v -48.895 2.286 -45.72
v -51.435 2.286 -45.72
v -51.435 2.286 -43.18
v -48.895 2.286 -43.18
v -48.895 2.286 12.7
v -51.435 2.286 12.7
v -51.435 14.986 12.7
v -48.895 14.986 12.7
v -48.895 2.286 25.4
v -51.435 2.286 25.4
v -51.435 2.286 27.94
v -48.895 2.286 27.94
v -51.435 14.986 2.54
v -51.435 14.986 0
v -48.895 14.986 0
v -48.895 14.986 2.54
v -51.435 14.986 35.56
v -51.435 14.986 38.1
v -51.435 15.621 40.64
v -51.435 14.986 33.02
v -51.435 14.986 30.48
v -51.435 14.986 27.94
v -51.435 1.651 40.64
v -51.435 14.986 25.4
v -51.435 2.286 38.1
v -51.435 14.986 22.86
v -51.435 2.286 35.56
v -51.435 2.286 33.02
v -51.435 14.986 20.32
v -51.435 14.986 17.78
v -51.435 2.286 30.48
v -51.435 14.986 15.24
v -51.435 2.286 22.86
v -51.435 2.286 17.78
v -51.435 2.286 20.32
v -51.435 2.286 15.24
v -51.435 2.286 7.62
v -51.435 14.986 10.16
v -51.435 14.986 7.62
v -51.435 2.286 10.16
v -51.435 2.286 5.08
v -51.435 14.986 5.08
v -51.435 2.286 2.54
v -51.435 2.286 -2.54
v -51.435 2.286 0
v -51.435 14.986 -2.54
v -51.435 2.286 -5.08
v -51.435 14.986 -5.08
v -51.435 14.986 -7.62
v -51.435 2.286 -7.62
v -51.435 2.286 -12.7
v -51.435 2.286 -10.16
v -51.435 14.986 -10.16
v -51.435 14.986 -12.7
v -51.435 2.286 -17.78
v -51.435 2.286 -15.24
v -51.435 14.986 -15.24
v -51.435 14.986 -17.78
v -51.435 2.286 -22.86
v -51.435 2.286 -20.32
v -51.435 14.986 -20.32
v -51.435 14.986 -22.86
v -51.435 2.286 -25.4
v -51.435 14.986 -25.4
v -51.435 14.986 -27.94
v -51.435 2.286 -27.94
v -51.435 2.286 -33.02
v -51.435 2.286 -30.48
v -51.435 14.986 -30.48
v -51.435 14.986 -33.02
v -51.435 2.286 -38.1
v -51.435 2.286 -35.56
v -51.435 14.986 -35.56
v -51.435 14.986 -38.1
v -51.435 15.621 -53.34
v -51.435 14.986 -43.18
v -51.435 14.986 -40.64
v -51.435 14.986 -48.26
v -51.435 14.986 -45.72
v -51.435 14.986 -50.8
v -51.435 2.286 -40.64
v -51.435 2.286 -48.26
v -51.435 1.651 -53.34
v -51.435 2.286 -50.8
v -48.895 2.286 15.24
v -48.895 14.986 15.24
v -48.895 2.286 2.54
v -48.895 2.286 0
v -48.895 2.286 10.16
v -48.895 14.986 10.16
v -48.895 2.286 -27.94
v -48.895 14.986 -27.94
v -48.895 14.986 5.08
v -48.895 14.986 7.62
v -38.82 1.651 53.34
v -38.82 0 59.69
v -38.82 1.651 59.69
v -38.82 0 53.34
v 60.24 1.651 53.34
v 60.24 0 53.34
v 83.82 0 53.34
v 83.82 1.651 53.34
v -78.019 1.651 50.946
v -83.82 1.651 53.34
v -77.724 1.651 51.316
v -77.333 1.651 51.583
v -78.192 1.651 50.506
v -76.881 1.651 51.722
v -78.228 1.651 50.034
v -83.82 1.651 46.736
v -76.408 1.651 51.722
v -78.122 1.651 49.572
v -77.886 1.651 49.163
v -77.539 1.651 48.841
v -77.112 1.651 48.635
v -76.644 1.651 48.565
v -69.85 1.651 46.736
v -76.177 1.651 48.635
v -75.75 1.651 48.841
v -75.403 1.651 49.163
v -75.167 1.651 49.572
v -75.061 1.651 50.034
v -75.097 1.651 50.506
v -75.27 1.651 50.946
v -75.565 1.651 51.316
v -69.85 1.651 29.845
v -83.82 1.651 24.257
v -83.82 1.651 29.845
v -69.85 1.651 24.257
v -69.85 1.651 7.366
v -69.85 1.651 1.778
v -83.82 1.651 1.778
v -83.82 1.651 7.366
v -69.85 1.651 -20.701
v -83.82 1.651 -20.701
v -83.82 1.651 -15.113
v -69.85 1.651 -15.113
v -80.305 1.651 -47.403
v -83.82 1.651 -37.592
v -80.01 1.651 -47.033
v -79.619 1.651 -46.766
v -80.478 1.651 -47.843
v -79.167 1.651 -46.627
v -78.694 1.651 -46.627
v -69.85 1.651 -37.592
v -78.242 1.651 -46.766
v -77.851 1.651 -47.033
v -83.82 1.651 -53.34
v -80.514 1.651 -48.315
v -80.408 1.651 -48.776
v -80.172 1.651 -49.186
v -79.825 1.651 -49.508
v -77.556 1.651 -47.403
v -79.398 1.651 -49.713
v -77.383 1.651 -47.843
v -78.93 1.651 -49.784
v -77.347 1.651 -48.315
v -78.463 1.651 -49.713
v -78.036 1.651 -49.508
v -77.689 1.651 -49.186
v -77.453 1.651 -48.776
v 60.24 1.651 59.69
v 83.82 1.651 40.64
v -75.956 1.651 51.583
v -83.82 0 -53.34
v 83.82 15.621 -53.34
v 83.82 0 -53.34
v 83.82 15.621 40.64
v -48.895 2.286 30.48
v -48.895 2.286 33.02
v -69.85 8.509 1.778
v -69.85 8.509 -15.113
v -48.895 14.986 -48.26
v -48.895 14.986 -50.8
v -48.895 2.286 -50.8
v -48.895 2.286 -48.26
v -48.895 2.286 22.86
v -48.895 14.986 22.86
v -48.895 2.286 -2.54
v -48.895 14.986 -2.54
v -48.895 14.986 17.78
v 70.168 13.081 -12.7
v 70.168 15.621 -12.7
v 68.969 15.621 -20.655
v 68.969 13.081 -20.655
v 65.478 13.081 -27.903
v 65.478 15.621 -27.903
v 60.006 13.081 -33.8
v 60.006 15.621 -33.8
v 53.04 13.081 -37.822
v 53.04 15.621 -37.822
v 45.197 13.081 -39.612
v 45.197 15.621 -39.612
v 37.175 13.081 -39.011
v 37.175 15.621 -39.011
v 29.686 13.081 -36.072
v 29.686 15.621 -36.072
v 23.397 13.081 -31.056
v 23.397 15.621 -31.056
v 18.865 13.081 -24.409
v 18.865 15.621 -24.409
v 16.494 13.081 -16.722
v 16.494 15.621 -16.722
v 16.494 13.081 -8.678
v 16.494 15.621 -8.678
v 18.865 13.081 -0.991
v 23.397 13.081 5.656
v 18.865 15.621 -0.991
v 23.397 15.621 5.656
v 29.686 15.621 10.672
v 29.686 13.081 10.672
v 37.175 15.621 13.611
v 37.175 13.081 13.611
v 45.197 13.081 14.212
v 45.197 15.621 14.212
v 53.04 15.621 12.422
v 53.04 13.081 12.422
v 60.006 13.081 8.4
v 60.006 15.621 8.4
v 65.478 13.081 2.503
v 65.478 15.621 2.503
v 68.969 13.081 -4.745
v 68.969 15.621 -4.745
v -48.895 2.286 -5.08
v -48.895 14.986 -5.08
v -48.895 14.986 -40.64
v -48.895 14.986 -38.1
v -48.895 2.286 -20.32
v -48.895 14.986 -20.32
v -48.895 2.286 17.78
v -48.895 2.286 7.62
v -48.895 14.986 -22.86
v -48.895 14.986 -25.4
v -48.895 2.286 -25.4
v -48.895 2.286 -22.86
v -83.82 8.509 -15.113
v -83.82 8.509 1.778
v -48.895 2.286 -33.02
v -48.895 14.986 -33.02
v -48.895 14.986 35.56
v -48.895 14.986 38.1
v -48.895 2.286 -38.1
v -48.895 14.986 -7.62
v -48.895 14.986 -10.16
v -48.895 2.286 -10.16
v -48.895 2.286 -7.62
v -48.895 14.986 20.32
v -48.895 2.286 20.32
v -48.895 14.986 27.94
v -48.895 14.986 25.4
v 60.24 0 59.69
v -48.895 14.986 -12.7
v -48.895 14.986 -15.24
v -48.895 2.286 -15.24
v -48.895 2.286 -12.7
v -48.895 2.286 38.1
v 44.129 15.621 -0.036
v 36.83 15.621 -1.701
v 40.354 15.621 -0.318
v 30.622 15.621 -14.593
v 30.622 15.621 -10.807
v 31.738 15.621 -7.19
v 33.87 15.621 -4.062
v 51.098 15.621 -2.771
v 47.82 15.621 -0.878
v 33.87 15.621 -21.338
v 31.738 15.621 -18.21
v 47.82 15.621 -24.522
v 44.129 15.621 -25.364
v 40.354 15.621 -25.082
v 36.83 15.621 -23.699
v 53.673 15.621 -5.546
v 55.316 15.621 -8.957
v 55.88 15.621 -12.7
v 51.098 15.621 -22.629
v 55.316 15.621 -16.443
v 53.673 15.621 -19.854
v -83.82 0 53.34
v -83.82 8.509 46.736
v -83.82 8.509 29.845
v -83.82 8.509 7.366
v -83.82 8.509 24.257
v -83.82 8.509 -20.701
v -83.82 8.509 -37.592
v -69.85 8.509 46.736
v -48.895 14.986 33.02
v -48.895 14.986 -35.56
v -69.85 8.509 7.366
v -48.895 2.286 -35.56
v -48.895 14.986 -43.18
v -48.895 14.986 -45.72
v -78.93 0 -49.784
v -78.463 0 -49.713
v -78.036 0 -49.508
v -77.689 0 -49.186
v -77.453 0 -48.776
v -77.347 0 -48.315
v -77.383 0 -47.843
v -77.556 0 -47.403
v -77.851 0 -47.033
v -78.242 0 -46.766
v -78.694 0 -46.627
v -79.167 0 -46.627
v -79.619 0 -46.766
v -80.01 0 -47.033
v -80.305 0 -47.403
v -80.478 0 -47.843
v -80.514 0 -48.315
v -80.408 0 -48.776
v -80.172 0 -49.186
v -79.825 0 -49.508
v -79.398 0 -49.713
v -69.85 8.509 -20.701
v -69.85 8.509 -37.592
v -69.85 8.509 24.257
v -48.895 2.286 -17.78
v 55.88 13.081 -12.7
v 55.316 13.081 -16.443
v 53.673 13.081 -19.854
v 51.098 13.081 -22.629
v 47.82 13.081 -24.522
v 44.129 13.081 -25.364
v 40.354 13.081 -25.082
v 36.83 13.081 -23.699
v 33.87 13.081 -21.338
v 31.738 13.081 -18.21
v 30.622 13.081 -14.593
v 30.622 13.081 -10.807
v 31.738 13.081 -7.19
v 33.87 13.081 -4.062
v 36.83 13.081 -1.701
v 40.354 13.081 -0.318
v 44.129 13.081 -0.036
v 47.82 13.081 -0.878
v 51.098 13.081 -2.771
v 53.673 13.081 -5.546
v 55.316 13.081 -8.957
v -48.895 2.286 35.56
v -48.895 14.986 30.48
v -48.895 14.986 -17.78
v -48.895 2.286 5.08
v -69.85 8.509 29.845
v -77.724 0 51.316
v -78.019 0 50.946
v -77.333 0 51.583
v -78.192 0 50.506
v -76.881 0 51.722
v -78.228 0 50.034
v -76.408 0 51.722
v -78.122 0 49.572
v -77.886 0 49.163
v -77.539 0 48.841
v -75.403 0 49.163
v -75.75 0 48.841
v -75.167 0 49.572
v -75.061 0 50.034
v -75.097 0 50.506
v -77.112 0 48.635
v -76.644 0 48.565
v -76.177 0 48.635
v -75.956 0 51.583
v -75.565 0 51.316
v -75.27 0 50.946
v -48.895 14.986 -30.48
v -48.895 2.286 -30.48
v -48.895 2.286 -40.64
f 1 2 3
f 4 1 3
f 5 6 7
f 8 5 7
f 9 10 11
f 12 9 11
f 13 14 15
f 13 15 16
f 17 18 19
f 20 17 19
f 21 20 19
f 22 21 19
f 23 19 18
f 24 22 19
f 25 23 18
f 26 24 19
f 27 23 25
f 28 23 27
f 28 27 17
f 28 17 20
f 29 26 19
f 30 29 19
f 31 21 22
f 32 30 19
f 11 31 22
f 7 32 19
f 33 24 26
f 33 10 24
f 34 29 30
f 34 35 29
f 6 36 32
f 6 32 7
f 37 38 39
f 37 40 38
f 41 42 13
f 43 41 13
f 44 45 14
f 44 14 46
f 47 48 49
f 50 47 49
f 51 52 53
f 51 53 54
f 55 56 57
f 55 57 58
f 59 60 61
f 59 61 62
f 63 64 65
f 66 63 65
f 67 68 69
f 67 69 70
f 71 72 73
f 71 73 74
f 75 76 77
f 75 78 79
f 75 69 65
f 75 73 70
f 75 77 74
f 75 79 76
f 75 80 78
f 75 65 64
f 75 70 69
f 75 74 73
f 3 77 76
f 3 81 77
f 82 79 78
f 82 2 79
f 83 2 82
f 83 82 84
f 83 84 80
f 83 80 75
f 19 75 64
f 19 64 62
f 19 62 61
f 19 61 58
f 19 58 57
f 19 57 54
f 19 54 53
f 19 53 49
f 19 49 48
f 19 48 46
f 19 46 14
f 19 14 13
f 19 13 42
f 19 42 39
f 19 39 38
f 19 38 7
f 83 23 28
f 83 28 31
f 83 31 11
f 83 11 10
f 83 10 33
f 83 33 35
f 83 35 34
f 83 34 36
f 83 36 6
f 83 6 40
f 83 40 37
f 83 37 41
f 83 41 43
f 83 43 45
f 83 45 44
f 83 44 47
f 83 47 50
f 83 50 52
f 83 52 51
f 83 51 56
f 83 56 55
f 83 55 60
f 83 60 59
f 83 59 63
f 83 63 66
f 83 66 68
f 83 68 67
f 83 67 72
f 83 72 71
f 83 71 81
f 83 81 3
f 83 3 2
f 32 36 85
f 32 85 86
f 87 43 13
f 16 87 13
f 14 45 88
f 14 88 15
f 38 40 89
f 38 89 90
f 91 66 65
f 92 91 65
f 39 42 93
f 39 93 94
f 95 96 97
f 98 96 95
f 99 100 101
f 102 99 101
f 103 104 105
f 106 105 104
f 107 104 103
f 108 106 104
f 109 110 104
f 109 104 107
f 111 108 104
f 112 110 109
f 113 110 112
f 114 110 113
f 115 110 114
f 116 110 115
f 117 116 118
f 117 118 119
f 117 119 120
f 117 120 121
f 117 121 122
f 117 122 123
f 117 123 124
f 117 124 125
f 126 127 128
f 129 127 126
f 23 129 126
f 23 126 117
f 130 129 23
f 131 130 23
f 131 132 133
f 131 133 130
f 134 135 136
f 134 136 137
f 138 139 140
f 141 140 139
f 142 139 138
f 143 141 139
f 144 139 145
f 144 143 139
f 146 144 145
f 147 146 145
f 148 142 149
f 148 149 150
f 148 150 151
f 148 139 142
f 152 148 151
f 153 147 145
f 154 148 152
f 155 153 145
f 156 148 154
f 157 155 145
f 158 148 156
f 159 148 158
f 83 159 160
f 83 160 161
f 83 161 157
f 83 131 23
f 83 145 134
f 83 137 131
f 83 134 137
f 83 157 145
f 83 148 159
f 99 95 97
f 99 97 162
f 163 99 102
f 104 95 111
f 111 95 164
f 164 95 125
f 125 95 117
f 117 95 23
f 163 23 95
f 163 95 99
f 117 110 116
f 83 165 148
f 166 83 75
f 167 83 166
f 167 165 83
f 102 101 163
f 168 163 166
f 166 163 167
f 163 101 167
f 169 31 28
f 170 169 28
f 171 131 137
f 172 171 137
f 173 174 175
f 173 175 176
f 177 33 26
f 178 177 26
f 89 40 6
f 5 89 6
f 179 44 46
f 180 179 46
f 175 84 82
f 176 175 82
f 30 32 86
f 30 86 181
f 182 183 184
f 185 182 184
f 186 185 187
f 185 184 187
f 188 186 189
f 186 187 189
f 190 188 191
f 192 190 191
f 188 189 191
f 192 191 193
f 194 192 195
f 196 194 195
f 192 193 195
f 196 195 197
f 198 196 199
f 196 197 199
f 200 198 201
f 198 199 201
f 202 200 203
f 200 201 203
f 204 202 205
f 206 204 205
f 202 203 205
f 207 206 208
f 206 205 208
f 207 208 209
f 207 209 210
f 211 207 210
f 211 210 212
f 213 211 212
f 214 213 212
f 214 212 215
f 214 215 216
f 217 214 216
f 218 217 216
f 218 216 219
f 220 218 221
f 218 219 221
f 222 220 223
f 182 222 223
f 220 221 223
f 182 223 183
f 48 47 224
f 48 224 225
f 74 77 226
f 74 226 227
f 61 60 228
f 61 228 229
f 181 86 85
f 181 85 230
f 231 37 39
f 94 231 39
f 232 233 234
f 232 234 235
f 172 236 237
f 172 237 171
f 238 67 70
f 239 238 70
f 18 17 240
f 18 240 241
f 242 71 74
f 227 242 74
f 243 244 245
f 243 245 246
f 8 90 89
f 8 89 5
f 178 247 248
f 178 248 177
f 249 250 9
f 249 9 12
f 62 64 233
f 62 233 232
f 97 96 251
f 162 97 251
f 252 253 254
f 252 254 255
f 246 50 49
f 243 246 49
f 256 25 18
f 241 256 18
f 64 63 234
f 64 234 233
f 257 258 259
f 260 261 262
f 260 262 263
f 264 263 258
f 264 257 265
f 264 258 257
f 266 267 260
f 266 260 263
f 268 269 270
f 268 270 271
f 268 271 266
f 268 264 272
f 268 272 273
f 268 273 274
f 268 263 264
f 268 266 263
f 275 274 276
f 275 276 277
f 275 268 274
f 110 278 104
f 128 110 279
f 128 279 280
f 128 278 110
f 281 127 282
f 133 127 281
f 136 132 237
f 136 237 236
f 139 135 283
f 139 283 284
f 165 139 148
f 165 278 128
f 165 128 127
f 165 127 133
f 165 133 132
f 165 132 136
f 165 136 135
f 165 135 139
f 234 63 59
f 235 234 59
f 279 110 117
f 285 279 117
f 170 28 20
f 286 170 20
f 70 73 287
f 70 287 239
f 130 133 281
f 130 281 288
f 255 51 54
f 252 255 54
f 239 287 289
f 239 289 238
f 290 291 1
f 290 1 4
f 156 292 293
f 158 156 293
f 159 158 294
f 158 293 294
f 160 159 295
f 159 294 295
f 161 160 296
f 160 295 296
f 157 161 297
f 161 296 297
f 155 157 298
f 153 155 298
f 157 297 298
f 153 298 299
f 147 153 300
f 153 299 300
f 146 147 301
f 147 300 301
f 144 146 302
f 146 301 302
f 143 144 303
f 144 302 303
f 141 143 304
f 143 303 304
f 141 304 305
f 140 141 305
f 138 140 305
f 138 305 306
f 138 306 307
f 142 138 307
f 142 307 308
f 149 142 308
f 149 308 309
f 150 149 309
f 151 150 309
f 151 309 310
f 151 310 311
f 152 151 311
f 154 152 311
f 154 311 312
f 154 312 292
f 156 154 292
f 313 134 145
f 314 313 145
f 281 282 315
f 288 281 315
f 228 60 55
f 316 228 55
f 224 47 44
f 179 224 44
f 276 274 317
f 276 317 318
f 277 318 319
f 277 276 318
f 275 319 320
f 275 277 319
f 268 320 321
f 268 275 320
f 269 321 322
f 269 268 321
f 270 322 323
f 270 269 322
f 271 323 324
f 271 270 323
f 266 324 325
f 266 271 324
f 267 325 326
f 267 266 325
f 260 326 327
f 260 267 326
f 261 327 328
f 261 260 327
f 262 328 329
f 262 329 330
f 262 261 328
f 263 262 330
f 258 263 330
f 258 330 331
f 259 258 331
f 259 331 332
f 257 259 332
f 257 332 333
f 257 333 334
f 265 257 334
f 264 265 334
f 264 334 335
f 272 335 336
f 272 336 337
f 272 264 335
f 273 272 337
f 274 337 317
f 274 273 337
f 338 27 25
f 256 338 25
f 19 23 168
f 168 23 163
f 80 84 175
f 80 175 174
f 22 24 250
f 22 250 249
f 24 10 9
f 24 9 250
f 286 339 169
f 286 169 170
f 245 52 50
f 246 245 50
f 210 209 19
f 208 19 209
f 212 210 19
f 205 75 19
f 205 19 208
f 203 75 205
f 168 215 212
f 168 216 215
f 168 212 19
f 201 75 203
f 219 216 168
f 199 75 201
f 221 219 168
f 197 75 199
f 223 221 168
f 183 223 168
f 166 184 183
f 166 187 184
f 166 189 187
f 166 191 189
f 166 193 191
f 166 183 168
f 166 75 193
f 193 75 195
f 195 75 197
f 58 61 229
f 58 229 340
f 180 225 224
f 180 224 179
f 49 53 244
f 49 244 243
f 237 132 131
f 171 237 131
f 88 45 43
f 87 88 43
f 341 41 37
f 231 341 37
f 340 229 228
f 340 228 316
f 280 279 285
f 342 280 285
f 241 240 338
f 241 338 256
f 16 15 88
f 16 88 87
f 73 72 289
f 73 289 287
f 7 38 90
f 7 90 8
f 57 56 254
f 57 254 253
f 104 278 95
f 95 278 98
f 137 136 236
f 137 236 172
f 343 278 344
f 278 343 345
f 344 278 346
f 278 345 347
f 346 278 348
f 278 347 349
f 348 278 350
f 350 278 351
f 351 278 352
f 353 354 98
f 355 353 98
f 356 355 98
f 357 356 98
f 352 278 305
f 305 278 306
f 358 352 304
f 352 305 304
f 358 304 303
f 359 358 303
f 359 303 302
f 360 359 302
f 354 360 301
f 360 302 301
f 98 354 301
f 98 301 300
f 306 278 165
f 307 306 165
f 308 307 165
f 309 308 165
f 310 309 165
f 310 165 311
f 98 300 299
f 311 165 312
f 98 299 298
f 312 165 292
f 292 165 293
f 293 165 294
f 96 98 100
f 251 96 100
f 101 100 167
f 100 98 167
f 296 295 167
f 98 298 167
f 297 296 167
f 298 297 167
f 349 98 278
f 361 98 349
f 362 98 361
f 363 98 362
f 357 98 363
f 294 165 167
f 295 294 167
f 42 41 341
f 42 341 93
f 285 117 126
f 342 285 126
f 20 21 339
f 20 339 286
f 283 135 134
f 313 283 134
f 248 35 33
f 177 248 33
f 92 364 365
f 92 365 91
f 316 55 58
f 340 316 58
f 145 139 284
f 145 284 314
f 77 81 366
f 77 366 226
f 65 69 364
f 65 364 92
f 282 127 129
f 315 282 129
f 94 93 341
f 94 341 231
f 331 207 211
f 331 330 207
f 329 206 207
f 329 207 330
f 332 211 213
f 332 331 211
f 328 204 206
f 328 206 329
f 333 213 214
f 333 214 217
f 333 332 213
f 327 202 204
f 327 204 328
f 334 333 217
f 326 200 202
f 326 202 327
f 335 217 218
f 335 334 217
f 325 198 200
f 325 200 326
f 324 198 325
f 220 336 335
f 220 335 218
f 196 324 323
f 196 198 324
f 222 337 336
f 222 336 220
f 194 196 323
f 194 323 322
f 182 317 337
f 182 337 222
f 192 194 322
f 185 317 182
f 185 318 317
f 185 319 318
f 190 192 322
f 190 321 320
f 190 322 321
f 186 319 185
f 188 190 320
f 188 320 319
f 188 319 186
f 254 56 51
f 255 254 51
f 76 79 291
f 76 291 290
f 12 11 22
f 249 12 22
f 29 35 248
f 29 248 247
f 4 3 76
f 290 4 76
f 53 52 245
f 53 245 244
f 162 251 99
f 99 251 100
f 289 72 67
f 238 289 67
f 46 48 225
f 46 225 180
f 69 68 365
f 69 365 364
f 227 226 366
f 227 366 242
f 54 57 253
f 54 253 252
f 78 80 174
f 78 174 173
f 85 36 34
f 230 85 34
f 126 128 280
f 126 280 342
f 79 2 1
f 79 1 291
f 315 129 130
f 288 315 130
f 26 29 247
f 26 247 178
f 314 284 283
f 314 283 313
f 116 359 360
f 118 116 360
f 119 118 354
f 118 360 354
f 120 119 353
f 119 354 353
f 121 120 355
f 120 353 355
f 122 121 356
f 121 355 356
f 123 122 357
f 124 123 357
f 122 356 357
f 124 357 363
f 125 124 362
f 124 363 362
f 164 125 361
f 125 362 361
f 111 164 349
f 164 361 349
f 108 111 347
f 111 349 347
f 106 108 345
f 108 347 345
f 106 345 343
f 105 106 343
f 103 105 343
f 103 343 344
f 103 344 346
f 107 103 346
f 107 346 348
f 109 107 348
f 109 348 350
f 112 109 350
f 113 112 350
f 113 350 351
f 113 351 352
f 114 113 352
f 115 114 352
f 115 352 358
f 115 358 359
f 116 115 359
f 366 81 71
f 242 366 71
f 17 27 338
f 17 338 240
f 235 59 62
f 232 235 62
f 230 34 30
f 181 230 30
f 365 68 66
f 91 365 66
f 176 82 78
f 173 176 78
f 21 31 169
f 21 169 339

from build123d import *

# Parameters (mm, degrees)
SKETCH1_W             = 167.64
SKETCH1_H             = 106.68
SKETCH1_W_2           = 99.06
SKETCH1_H_2           = 6.35
BOSS_EXTRUDE1_DEPTH   = 1.651
SKETCH2_W             = 135.255
SKETCH2_H             = 93.98
BOSS_EXTRUDE2_DEPTH   = 13.97
F_4_CLEARANCE_HOLE1_D = 3.175
SKETCH6_W             = 13.97
SKETCH6_H             = 16.891
BOSS_EXTRUDE3_DEPTH   = 6.858
SKETCH7_W             = 2.54
SKETCH7_H             = 12.7
CUT_EXTRUDE5_DEPTH    = 2.54
LPATTERN1_COUNT       = 18
LPATTERN1_PITCH       = 5.08
SKETCH8_R             = 26.9875
SKETCH8_R_2           = 12.7
CUT_EXTRUDE6_DEPTH    = 2.54


with BuildPart() as part:
    # Sketch1 → Boss-Extrude1 (new body)
    with BuildSketch(Plane(origin=(0, 0, 0), x_dir=(1, 0, 0), z_dir=(0, 1, 0))):
        Rectangle(SKETCH1_W, SKETCH1_H)
        with Locations((10.71, -56.515)):
            Rectangle(SKETCH1_W_2, SKETCH1_H_2)
    extrude(amount=BOSS_EXTRUDE1_DEPTH)

    # Sketch2 → Boss-Extrude2 (add)
    with BuildSketch(Plane(origin=(0, 1.651, 0), x_dir=(1, 0, 0), z_dir=(0, 1, 0))):
        with Locations((16.1925, 6.35)):
            Rectangle(SKETCH2_W, SKETCH2_H)
    extrude(amount=BOSS_EXTRUDE2_DEPTH)

    # #4 Clearance Hole1 (through all)
    with Locations(Plane(origin=(-78.9305, 1.651, -48.1965), x_dir=(0, 0, 1), z_dir=(0, 1, 0))):
        with Locations((0, 0), (98.3488, 2.286)):
            Hole(F_4_CLEARANCE_HOLE1_D / 2)

    # Sketch6 → Boss-Extrude3 (add)
    with BuildSketch(Plane(origin=(0, 1.651, 0), x_dir=(1, 0, 0), z_dir=(0, 1, 0))):
        with Locations((-76.835, 29.1465)):
            Rectangle(SKETCH6_W, SKETCH6_H)
        with Locations((-76.835, 6.6675)):
            Rectangle(SKETCH6_W, SKETCH6_H)
        with Locations((-76.835, -15.8115)):
            Rectangle(SKETCH6_W, SKETCH6_H)
        with Locations((-76.835, -38.2905)):
            Rectangle(SKETCH6_W, SKETCH6_H)
    extrude(amount=BOSS_EXTRUDE3_DEPTH)

    # Sketch7 → Cut-Extrude5 (cut)
    with BuildSketch(Plane.ZY.offset(51.435)):
        with Locations((36.83, 8.636)):
            Rectangle(SKETCH7_W, SKETCH7_H)
    cut_extrude5 = extrude(amount=-CUT_EXTRUDE5_DEPTH, mode=Mode.SUBTRACT)

    # LPattern1: Cut-Extrude5 ×18
    with Locations(*[(0, 0, -i * LPATTERN1_PITCH) for i in range(1, LPATTERN1_COUNT)]):
        add(cut_extrude5, mode=Mode.SUBTRACT)

    # Sketch8 → Cut-Extrude6 (cut)
    with BuildSketch(Plane(origin=(0, 15.621, 0), x_dir=(1, 0, 0), z_dir=(0, 1, 0))):
        with Locations((43.18, 12.7)):
            Circle(SKETCH8_R)
        with Locations((43.18, 12.7)):
            Circle(SKETCH8_R_2, mode=Mode.SUBTRACT)
    extrude(amount=-CUT_EXTRUDE6_DEPTH, mode=Mode.SUBTRACT)


solid = part.part
